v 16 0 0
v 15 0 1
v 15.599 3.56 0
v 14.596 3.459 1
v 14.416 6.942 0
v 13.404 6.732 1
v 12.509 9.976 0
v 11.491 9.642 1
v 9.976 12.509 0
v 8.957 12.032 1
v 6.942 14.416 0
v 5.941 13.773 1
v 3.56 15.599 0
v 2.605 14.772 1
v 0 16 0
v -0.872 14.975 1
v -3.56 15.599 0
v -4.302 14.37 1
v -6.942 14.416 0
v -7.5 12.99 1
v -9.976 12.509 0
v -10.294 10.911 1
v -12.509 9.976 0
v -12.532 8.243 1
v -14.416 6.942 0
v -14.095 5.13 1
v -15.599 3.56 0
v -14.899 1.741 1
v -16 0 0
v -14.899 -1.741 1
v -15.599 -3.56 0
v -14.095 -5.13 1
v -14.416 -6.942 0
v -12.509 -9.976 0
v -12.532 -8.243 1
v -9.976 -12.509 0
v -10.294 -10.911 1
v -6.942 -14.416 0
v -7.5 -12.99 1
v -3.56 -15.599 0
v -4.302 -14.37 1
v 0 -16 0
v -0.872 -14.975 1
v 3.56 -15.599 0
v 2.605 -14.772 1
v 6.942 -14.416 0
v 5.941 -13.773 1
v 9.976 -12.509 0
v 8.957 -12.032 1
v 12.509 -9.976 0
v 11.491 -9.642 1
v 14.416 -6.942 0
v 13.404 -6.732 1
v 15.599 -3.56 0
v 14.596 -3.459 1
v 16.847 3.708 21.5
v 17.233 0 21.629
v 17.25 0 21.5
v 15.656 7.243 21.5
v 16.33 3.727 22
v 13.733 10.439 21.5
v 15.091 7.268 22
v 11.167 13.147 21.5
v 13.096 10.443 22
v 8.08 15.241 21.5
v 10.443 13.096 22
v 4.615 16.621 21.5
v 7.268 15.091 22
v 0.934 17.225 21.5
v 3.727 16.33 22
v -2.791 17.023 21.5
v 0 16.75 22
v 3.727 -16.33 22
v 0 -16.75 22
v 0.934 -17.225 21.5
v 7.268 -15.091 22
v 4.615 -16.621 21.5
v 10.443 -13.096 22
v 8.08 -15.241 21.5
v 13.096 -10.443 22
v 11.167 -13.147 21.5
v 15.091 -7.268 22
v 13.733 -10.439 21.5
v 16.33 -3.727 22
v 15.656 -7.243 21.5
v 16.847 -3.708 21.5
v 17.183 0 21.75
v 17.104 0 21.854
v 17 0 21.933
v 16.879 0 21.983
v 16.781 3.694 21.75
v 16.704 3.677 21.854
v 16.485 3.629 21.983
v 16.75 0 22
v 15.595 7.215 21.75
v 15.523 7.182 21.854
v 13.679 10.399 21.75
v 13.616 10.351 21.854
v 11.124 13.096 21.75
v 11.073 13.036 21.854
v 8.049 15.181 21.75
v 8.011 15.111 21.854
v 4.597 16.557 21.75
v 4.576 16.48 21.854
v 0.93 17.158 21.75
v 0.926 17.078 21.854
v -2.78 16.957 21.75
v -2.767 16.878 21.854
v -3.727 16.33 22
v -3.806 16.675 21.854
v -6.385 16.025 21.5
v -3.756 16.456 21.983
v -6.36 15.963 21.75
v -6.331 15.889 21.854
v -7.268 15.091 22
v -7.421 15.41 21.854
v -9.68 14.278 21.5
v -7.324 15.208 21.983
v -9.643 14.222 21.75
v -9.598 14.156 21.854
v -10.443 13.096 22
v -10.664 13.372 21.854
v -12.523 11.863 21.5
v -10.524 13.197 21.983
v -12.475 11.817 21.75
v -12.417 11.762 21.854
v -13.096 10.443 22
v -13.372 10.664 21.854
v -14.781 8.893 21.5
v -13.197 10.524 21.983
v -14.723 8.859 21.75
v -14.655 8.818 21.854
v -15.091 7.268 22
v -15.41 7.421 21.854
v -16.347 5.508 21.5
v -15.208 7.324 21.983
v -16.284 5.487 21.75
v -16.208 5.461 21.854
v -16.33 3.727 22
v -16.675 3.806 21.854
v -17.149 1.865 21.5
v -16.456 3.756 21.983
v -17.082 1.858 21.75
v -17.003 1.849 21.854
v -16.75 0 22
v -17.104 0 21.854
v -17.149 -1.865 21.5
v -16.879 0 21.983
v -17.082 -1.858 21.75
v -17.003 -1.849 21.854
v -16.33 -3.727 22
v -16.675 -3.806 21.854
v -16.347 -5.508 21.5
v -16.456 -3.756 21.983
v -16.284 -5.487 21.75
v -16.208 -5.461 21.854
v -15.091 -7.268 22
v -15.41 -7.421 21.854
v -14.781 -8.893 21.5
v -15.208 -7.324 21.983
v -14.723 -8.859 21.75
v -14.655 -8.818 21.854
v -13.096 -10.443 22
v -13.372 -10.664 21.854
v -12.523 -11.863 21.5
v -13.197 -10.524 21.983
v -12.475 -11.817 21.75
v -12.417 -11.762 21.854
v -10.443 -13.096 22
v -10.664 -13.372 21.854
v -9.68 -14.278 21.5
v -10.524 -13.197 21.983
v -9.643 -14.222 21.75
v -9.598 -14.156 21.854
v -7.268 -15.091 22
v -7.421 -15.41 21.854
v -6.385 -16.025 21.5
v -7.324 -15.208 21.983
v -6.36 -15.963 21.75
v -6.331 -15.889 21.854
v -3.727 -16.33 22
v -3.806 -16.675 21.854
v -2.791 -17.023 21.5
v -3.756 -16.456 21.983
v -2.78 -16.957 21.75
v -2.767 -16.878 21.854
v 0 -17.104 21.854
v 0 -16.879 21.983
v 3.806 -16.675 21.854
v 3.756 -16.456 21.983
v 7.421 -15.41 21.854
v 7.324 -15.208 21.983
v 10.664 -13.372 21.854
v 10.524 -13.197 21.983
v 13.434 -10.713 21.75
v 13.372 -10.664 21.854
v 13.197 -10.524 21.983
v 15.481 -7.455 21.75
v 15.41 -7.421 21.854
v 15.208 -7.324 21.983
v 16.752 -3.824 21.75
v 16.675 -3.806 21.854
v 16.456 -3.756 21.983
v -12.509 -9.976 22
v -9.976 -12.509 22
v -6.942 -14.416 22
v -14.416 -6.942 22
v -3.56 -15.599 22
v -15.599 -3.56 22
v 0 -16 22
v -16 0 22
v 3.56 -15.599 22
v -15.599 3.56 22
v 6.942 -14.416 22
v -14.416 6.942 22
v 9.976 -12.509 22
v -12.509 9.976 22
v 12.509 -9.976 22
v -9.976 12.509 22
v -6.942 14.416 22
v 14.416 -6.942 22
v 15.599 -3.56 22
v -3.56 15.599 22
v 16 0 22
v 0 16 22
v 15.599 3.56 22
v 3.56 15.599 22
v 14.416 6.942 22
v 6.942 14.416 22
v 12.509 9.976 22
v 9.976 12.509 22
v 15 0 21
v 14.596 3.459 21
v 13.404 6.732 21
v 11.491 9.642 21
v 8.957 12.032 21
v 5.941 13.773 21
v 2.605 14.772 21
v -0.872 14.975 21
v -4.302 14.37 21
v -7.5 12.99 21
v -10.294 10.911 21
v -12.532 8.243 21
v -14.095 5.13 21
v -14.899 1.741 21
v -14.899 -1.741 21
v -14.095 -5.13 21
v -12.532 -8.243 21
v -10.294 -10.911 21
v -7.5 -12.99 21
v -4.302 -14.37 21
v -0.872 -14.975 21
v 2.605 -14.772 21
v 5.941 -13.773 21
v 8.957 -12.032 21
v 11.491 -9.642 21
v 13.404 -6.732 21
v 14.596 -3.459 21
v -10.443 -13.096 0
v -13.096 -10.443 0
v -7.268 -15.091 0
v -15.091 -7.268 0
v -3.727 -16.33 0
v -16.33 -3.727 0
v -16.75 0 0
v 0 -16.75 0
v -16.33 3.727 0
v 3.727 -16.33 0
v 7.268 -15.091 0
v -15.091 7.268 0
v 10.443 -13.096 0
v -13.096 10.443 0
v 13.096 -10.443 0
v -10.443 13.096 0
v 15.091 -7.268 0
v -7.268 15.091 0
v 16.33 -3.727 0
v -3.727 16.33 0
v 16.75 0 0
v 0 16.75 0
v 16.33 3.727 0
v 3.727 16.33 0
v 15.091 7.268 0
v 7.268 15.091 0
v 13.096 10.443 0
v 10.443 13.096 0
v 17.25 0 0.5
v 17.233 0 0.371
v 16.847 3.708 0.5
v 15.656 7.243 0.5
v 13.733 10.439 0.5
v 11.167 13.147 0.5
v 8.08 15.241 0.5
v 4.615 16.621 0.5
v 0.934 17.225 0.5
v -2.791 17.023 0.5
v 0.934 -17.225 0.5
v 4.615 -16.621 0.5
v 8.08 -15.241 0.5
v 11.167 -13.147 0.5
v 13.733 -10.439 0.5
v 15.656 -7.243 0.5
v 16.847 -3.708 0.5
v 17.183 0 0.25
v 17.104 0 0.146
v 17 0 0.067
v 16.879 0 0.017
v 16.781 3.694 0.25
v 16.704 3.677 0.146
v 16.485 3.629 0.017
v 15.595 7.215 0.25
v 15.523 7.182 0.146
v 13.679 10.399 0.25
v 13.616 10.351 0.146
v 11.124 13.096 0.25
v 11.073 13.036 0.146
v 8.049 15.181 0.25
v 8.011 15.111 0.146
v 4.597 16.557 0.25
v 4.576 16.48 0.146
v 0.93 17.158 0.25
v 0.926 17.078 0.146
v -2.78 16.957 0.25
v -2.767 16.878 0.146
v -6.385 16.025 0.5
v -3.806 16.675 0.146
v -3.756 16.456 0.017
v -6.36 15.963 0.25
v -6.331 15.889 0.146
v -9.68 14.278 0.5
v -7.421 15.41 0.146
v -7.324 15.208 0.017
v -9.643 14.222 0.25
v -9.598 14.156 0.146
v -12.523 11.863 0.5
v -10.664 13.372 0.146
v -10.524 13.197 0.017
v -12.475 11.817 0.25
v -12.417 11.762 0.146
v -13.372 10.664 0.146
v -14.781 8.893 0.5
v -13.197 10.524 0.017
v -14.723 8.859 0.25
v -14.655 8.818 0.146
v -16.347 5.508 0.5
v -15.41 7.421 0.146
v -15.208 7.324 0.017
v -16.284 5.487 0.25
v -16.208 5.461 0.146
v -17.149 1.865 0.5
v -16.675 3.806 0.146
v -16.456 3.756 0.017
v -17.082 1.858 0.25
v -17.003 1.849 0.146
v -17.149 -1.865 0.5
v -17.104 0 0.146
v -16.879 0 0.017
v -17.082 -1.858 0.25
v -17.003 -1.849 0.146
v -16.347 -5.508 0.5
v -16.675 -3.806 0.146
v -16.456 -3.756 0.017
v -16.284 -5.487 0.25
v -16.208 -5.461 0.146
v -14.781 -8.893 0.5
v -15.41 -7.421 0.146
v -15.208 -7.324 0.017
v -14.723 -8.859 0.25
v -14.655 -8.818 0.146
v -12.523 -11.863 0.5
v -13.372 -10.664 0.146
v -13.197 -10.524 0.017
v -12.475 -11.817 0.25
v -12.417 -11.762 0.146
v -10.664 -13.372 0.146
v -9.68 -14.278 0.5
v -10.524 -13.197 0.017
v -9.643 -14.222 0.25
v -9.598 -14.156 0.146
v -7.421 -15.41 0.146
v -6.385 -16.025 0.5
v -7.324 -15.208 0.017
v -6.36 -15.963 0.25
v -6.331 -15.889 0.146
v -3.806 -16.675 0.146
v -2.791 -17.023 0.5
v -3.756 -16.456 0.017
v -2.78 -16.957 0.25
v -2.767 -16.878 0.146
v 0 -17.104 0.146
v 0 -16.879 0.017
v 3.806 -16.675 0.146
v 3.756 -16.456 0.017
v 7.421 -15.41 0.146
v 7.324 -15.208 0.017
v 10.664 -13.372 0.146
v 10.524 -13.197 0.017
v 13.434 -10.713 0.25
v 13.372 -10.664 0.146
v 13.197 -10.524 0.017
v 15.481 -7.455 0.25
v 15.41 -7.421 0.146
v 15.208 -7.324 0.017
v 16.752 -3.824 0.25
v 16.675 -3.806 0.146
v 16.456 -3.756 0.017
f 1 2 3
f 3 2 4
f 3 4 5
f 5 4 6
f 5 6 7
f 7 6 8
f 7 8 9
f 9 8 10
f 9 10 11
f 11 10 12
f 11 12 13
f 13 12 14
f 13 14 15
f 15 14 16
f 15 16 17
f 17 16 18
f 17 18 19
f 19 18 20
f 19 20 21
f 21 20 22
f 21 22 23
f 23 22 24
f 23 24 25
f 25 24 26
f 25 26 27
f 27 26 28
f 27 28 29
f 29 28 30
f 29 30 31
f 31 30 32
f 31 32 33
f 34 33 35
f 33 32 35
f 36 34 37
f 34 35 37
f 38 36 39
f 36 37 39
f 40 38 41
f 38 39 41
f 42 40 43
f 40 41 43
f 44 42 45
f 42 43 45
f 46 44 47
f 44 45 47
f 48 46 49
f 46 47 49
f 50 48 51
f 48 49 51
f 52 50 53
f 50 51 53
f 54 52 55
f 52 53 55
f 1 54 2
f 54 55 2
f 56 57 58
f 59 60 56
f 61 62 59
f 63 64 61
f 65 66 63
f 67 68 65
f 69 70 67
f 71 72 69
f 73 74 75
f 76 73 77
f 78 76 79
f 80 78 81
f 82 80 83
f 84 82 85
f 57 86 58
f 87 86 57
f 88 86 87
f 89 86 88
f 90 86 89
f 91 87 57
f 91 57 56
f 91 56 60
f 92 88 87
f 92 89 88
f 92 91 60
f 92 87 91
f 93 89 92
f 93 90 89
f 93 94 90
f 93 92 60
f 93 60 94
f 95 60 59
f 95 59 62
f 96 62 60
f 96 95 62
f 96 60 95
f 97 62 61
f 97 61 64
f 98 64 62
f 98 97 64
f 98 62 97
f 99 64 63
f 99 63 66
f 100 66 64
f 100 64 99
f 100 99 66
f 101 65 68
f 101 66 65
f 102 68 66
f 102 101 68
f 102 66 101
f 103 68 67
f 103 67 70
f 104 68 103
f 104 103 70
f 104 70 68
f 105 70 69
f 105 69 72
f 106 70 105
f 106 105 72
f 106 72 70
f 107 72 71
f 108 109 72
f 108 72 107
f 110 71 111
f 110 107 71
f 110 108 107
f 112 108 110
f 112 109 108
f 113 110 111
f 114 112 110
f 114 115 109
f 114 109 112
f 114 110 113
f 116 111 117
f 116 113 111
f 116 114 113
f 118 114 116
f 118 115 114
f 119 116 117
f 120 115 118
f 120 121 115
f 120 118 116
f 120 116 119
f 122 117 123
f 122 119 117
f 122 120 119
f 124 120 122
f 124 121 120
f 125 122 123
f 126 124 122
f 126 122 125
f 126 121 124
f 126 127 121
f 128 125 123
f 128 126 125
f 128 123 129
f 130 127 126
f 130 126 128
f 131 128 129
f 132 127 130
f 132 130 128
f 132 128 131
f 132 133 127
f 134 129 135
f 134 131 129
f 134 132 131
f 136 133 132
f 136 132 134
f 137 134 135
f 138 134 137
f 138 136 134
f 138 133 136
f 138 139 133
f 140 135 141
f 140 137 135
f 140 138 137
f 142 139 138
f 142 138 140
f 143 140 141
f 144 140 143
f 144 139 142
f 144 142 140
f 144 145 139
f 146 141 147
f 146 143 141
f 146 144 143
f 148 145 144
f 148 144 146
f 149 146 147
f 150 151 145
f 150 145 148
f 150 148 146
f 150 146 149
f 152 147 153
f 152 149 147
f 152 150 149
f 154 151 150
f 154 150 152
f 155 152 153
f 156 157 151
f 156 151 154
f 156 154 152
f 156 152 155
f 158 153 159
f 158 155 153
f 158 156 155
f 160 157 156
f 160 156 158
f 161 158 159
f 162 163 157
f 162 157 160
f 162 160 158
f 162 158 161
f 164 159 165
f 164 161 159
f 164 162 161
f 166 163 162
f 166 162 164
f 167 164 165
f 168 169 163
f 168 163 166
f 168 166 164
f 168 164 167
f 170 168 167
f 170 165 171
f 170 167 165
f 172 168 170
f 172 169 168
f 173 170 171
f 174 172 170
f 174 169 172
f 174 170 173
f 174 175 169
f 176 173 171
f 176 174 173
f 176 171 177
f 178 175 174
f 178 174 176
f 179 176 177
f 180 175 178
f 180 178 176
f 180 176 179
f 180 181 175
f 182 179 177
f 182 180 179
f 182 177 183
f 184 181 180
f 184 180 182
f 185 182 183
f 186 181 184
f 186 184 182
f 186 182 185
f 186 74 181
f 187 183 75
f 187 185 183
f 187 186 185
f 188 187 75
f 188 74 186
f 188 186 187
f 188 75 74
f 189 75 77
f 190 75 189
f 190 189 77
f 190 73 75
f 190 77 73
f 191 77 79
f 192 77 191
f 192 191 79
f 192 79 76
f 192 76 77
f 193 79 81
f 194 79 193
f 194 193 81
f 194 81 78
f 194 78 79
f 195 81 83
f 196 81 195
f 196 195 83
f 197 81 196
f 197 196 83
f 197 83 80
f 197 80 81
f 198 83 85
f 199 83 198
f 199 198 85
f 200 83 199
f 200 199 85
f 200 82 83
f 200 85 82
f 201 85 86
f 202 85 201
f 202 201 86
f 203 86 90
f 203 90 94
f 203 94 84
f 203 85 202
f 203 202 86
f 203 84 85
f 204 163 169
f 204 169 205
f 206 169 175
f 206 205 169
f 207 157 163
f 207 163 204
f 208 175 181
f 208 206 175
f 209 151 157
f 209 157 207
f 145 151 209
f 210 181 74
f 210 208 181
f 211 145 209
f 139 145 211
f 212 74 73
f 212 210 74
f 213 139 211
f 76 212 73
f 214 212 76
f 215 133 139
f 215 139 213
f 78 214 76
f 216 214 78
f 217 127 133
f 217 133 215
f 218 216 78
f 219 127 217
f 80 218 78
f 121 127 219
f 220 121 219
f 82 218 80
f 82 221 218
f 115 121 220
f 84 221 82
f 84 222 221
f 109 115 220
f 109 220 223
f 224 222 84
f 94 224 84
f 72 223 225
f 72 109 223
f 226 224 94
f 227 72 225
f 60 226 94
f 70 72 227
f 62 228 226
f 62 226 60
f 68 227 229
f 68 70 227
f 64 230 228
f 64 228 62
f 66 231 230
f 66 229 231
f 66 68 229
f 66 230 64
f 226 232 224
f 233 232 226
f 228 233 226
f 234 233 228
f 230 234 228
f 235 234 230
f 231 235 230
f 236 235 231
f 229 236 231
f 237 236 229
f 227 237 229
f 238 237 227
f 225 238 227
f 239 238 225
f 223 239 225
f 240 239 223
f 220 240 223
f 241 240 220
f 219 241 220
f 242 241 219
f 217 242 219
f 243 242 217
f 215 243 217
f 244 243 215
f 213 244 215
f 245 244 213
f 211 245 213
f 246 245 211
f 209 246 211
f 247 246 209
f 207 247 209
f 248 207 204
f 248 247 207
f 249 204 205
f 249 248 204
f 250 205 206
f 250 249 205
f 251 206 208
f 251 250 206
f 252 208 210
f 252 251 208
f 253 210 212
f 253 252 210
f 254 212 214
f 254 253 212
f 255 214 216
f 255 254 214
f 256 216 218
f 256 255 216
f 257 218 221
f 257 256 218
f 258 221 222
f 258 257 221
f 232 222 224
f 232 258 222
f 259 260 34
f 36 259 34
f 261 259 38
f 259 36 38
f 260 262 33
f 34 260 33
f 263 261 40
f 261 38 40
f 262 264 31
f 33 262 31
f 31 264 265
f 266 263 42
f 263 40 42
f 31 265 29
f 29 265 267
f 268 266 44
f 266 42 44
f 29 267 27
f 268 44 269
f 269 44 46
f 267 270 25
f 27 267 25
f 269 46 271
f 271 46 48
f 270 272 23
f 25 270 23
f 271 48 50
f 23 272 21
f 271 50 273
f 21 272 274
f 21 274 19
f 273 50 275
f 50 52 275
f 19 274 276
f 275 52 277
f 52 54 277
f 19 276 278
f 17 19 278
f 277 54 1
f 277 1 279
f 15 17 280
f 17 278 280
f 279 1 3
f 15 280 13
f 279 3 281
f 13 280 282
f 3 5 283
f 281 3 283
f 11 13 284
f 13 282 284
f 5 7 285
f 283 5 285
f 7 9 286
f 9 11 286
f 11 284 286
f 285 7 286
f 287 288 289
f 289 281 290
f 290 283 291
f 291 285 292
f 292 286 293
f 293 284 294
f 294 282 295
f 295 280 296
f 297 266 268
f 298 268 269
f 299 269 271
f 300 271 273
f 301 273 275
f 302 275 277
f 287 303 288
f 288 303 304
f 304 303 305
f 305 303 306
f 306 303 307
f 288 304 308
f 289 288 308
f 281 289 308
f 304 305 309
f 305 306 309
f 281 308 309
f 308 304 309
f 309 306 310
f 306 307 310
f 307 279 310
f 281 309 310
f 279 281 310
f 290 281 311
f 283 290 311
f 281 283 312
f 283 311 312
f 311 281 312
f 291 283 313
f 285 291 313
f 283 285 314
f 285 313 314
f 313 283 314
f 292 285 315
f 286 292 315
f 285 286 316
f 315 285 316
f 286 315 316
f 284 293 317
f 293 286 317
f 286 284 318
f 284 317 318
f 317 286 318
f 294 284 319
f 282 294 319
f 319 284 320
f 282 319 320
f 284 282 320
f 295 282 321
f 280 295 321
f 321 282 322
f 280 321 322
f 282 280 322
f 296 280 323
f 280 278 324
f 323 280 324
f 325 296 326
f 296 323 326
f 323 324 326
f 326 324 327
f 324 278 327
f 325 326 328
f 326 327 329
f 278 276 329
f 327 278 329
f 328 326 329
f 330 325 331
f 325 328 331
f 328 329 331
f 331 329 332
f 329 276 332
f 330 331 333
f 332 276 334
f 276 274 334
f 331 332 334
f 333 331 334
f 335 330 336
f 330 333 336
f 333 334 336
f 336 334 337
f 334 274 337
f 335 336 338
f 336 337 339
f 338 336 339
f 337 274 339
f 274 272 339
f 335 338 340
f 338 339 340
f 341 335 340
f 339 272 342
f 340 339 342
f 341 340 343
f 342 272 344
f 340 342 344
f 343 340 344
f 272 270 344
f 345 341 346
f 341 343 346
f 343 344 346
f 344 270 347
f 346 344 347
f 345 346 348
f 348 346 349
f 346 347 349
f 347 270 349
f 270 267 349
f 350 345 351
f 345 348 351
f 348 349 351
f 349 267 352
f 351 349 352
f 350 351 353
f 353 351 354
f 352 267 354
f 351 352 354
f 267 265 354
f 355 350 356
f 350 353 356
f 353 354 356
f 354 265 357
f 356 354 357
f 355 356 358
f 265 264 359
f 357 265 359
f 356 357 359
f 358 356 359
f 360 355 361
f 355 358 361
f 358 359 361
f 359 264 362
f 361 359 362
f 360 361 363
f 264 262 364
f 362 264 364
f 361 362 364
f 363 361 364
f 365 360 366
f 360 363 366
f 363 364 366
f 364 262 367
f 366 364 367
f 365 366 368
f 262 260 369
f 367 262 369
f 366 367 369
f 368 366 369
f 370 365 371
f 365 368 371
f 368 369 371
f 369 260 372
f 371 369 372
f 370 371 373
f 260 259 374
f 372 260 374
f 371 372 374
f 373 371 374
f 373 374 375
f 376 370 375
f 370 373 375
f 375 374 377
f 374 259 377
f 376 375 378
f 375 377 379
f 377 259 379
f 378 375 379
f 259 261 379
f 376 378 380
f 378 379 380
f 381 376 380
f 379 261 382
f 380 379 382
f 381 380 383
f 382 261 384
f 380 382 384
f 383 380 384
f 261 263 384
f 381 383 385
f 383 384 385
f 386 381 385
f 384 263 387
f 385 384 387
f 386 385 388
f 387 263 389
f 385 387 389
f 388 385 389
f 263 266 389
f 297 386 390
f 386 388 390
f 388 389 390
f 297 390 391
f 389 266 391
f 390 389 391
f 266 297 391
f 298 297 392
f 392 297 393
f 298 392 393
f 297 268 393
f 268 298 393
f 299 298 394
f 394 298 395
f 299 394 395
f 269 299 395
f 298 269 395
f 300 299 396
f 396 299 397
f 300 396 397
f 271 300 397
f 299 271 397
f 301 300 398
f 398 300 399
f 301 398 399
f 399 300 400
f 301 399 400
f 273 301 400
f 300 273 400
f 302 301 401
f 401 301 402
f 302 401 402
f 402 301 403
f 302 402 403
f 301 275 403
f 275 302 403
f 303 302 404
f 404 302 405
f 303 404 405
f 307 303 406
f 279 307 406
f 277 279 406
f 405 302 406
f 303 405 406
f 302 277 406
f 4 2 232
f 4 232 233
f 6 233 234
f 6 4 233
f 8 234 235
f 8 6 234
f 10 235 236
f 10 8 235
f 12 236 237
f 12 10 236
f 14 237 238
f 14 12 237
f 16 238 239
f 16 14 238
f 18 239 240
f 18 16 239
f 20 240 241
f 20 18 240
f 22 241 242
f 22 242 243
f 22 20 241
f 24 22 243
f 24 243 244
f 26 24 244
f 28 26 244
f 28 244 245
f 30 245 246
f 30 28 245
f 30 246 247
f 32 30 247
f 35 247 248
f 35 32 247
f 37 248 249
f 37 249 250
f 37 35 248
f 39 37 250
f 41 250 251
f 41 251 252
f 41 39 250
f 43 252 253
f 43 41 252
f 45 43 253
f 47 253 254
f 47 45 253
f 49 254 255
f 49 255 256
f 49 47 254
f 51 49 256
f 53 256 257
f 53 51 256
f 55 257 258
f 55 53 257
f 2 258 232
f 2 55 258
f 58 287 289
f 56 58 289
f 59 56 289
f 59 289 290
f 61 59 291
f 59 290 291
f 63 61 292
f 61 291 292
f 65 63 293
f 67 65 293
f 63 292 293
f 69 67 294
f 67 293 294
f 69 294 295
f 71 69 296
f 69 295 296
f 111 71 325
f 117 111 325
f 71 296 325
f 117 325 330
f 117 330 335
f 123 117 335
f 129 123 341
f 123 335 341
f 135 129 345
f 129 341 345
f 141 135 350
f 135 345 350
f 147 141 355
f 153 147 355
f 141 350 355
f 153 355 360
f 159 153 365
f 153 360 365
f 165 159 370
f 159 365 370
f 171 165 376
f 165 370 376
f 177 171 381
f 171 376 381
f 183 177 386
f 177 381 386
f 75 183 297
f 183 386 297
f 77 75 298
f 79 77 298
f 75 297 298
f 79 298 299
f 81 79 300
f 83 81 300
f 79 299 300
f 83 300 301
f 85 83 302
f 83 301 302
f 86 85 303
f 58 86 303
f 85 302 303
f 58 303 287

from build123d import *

# Parameters (mm, degrees)
ESQUISSE1_R          = 17.25
ESQUISSE1_R_2        = 15
BASE_EXTRUSION_DEPTH = 22
CONG_1_R             = 0.5
CHANFREIN1_SIZE      = 1


with BuildPart() as part:
    # Esquisse1 → Base-Extrusion (new body)
    with BuildSketch(Plane.XY):
        Circle(ESQUISSE1_R)
        Circle(ESQUISSE1_R_2, mode=Mode.SUBTRACT)
    extrude(amount=BASE_EXTRUSION_DEPTH)

    # Congé1
    cong_1_edges = [part.edges().sort_by_distance(p)[0] for p in [
        (-17.25, 0, 0),
        (-17.25, 0, 22),
    ]]
    fillet(cong_1_edges, radius=CONG_1_R)

    # Chanfrein1
    chanfrein1_edges = [part.edges().sort_by_distance(p)[0] for p in [
        (-15, 0, 0),
        (-15, 0, 22),
    ]]
    chamfer(chanfrein1_edges, length=CHANFREIN1_SIZE)


solid = part.part
